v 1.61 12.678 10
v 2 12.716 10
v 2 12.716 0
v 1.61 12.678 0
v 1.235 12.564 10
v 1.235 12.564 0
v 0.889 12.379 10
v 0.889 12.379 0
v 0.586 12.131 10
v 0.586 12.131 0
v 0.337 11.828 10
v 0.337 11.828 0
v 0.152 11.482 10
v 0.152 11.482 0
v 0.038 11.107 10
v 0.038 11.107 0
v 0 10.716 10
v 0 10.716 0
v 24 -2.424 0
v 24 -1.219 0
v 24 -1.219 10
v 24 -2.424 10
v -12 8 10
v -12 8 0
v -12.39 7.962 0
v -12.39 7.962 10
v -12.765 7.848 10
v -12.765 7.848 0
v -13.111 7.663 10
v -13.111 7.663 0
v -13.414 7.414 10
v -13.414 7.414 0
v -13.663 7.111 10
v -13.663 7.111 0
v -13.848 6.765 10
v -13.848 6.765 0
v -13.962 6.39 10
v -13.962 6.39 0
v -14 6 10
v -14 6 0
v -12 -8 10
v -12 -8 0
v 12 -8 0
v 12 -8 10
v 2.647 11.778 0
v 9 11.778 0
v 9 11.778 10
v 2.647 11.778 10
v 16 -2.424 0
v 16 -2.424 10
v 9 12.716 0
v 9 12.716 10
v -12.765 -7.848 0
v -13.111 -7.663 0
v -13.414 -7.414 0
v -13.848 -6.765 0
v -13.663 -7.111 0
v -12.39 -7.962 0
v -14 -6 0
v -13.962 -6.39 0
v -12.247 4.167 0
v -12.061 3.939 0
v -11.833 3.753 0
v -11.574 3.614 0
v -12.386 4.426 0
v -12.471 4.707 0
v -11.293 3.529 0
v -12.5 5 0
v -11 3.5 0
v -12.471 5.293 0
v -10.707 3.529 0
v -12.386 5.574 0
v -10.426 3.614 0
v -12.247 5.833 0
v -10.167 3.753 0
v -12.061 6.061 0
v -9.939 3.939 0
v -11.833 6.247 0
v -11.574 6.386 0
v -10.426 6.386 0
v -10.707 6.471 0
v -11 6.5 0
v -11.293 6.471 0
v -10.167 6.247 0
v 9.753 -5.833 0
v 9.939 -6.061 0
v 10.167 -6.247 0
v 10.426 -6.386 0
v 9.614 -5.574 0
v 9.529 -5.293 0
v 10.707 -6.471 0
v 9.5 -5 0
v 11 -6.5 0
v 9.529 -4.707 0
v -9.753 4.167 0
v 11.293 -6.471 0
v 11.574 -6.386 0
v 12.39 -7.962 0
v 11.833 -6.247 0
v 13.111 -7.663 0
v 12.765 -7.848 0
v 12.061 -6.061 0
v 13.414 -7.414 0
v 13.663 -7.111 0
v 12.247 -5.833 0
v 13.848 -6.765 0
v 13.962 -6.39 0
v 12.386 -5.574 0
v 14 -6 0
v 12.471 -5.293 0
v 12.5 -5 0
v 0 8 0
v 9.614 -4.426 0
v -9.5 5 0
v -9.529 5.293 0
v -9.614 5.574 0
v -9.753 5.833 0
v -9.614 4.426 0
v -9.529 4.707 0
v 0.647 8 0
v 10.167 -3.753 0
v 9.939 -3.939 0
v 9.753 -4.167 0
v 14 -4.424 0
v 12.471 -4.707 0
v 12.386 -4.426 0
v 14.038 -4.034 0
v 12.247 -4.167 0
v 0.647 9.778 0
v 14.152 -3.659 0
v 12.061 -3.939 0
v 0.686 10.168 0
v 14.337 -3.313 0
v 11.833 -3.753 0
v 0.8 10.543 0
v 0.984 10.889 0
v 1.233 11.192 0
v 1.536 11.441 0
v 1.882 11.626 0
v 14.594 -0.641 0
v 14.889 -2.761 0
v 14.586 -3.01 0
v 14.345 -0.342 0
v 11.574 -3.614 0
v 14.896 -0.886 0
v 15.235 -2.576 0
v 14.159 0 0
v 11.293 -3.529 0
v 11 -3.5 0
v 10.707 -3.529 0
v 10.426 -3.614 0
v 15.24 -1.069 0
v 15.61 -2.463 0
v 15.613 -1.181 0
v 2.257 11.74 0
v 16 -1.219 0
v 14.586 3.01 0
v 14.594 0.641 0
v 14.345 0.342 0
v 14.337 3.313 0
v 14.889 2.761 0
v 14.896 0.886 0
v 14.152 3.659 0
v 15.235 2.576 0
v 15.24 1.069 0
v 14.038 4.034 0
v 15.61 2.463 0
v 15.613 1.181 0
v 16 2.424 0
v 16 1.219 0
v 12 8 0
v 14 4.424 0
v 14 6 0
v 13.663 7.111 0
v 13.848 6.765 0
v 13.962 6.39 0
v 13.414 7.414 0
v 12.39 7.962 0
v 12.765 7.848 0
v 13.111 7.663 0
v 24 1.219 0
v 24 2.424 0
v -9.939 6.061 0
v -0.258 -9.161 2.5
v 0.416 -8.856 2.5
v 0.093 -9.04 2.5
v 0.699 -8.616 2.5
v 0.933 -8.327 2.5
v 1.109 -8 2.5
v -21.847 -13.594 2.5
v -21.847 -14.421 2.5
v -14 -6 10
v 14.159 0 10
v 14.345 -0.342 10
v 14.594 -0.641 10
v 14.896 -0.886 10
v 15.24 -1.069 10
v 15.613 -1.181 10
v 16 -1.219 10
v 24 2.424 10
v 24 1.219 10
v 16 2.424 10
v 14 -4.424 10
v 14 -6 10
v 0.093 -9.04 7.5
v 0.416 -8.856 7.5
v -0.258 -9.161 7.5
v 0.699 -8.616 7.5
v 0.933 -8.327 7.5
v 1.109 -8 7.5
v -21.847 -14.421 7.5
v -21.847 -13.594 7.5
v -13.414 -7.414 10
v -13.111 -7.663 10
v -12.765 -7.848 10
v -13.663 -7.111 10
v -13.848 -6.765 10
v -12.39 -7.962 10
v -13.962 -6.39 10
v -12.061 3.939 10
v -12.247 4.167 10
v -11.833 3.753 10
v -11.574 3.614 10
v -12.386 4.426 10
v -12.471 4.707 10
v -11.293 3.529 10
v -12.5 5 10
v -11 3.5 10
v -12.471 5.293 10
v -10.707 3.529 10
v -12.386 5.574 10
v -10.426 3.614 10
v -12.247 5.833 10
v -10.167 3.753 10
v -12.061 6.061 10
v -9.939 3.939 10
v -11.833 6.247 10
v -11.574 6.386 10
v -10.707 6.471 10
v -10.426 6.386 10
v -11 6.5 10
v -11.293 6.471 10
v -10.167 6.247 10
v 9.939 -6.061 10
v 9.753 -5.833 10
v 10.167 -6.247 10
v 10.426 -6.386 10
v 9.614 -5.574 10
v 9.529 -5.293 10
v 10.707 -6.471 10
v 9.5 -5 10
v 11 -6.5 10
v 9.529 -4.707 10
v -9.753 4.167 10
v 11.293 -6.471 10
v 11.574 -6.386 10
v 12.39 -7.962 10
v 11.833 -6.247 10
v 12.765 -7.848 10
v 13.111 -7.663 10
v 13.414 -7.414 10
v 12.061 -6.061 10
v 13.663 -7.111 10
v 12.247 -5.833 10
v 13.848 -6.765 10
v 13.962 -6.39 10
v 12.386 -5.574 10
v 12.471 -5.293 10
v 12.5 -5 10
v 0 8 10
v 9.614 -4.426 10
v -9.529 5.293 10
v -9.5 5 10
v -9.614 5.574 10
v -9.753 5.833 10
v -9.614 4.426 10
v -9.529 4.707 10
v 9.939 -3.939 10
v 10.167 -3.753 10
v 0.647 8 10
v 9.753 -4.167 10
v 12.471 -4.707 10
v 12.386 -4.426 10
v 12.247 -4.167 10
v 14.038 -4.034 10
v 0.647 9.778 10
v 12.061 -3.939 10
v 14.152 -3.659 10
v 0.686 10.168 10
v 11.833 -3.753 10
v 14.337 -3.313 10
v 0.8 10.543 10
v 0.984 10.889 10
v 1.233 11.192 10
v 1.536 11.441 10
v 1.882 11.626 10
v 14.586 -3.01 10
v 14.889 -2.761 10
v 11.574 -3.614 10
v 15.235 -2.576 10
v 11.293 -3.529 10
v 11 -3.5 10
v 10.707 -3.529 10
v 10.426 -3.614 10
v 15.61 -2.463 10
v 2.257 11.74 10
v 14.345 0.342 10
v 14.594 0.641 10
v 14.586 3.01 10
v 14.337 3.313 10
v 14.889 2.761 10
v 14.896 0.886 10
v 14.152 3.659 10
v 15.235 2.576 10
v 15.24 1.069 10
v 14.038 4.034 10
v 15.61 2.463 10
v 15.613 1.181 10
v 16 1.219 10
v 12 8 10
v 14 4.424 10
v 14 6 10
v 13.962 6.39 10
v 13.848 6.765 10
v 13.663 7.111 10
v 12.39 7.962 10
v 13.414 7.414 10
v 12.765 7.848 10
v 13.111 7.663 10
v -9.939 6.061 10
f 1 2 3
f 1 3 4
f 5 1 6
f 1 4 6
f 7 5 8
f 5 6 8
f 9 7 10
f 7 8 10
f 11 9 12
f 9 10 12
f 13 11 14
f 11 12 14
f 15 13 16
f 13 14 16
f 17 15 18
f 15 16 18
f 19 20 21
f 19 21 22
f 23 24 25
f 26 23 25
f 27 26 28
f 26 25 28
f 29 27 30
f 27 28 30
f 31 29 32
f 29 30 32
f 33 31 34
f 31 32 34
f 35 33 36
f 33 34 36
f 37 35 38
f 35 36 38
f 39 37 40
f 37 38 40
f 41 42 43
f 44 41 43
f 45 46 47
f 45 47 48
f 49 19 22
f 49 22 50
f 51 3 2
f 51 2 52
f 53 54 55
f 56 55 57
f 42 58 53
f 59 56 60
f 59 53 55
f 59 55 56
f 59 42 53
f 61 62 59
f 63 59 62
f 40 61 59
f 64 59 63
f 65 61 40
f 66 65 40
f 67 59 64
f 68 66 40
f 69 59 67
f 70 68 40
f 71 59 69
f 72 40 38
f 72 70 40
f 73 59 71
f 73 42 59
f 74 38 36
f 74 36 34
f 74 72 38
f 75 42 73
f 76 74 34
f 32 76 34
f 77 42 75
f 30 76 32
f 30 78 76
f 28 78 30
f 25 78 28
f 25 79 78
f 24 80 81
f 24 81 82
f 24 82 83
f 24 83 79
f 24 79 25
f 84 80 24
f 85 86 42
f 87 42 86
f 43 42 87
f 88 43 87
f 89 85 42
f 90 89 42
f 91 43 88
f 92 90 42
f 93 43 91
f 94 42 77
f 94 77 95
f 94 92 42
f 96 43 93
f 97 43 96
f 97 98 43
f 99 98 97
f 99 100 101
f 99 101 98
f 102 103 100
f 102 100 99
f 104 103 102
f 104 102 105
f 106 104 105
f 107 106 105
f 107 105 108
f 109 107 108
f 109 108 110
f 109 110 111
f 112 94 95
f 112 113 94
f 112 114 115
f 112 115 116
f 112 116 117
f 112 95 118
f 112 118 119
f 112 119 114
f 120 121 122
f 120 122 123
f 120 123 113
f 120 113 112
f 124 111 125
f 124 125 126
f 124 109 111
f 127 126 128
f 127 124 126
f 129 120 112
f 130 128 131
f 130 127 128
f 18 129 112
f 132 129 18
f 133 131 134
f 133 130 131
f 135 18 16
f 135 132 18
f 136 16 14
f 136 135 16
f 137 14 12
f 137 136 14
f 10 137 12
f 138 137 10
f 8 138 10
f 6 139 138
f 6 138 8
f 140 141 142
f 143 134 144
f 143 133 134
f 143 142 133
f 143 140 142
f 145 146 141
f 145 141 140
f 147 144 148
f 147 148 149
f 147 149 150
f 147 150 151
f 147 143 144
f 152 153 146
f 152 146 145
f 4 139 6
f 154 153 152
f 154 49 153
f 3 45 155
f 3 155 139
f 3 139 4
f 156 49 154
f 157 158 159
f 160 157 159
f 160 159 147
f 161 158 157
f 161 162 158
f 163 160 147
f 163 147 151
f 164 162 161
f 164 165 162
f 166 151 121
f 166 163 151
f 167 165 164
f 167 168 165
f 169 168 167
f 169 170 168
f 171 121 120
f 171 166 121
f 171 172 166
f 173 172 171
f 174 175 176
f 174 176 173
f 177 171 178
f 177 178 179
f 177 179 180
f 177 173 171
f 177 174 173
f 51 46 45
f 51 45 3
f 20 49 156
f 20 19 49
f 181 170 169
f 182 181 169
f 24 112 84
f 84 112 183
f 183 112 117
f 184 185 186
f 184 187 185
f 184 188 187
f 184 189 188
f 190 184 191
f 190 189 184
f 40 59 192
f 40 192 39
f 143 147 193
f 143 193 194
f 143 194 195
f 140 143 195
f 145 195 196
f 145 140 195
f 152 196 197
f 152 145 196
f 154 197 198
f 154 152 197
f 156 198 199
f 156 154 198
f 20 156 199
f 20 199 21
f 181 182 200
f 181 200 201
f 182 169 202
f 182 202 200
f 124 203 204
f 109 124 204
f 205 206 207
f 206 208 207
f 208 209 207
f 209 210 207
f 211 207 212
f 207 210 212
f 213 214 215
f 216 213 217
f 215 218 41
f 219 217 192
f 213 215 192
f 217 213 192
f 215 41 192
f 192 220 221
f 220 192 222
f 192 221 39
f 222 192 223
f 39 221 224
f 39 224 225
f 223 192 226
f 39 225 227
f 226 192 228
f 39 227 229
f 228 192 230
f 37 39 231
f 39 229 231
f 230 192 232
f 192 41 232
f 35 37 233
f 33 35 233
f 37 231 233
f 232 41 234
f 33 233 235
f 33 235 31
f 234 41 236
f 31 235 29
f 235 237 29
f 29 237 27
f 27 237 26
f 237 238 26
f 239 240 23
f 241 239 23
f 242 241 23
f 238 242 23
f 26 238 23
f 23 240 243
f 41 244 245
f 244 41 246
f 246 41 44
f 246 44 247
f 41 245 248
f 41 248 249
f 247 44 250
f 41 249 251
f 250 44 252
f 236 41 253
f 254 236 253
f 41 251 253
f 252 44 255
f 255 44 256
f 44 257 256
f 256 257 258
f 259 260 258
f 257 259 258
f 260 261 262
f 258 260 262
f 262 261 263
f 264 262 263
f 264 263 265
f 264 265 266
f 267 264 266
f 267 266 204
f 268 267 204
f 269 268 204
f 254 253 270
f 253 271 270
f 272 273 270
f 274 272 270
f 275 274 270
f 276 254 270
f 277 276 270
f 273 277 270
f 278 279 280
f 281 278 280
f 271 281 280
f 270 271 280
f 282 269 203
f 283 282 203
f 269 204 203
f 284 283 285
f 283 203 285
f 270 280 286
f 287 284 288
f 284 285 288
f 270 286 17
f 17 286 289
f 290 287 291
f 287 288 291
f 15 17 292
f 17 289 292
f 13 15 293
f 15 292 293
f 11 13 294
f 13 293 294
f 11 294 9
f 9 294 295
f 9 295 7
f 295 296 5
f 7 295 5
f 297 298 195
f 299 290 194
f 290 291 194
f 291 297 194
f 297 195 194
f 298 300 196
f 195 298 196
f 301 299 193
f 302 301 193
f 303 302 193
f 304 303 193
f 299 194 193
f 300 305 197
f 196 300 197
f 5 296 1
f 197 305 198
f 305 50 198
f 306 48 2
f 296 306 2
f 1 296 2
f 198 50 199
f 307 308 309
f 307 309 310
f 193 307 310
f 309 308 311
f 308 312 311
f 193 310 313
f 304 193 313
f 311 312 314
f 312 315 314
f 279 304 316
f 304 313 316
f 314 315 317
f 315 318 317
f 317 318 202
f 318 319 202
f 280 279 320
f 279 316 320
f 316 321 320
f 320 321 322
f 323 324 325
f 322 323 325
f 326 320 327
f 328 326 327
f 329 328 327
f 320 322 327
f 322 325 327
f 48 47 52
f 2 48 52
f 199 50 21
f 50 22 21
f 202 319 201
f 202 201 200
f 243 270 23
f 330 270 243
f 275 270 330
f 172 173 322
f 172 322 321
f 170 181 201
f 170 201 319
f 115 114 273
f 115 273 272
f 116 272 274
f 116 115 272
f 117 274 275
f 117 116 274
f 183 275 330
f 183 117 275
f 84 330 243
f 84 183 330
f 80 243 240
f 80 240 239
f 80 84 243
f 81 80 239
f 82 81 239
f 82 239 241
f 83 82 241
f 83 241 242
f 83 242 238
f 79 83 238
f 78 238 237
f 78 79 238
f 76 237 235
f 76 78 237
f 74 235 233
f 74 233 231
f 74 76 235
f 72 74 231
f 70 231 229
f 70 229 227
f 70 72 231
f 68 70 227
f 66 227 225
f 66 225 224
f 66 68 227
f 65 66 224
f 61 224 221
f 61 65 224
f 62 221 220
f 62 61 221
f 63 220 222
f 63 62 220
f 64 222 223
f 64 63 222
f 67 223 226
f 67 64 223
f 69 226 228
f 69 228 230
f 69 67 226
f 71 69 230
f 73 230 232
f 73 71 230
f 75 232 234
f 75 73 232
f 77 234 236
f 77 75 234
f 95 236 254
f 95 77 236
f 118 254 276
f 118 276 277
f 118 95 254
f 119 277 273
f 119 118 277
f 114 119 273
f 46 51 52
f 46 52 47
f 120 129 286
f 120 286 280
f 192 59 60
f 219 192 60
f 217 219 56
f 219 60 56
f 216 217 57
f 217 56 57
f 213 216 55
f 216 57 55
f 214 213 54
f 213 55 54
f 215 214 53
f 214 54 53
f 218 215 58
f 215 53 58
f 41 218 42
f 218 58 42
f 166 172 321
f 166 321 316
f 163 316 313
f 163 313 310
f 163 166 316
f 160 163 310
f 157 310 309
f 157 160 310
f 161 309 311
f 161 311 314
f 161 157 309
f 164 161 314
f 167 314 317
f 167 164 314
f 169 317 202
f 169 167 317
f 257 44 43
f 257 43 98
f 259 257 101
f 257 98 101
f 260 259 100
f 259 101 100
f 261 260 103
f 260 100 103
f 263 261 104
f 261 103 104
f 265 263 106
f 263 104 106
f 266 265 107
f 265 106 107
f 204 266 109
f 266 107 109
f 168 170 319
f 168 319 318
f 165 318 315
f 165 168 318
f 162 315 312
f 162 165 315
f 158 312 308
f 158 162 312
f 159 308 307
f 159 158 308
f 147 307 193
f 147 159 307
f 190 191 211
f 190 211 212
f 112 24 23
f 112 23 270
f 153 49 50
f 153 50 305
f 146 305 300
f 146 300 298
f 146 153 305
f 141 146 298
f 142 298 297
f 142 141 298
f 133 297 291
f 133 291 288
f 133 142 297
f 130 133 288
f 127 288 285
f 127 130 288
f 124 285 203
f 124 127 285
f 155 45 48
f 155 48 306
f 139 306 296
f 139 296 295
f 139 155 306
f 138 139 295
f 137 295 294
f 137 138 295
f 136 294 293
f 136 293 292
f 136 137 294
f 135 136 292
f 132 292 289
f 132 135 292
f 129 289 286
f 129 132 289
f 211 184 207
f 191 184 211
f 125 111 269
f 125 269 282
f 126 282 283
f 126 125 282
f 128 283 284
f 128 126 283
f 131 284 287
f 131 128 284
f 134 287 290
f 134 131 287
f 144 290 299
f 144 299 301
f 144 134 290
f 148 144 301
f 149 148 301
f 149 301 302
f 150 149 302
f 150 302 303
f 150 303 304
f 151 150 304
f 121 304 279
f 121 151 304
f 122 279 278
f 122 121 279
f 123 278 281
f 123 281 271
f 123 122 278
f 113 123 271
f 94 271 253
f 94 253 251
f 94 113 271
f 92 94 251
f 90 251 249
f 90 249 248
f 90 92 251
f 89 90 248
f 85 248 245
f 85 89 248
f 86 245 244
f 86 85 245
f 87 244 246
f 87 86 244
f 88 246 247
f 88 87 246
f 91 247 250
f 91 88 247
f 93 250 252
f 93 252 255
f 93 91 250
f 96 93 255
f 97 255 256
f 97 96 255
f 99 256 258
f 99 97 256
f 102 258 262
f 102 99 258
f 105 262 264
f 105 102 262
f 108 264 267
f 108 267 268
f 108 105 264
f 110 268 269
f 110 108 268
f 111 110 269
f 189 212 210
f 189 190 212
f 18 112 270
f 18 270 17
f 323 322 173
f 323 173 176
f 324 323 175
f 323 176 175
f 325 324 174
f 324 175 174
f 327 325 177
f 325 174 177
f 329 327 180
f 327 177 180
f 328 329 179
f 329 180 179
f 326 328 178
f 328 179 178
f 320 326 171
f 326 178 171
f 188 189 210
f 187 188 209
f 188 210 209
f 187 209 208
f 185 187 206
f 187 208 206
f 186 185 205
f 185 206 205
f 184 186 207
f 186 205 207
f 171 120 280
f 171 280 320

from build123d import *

# Parameters (mm, degrees)
SKETCH2_R           = 1.5
BOSS_EXTRUDE1_DEPTH = 10
FILLET1_R           = 2
BOSS_EXTRUDE2_DEPTH = 2.5
FILLET2_R           = 2


with BuildPart() as part:
    # Sketch2 → Boss-Extrude1 (new body)
    with BuildSketch(Plane.XY):
        Polygon((0, 8), (0, 12.716374873), (9, 12.716374873), (9, 11.778068475), (0.647378108, 11.778068475), (0.647378108, 8), (14, 8), (14, 2.424084127), (24, 2.424084127), (24, 1.218725863), (14, 1.218725863), (14, -1.218725863), (24, -1.218725863), (24, -2.424084127), (14, -2.424084127), (14, -8), (3.483162405, -8), (-14, -8), (-14, 8), align=None)
        with Locations((-11, 5)):
            Circle(SKETCH2_R, mode=Mode.SUBTRACT)
        with Locations((11, -5)):
            Circle(SKETCH2_R, mode=Mode.SUBTRACT)
    extrude(amount=BOSS_EXTRUDE1_DEPTH)

    # Fillet1
    # the kernel refuses this fillet: 2 mm, written as the material it adds along each edge
    with BuildSketch(Plane(origin=(0.647378108, 11.778068475, 0), x_dir=(0, -1, 0), z_dir=(0, 0, 1)), Plane(origin=(14, 2.424084127, 0), x_dir=(1, 0, 0), z_dir=(0, 0, 1)), Plane(origin=(14, 1.218725863, 0), x_dir=(0, -1, 0), z_dir=(0, 0, 1)), Plane(origin=(14, -1.218725863, 0), x_dir=(1, 0, 0), z_dir=(0, 0, 1)), Plane(origin=(14, -2.424084127, 0), x_dir=(0, -1, 0), z_dir=(0, 0, 1))) as fillet1_piece_1:
        with BuildLine():
            CenterArc((FILLET1_R, FILLET1_R), FILLET1_R, 180, 90)
            Line((0, FILLET1_R), (0, 0))
            Line((0, 0), (FILLET1_R, 0))
        make_face()
    extrude(amount=10)
    # the kernel refuses this fillet: 2 mm, written as the material it takes off along each edge
    with BuildSketch(Plane(origin=(0, 12.716374873, -5), x_dir=(0, -1, 0), z_dir=(0, 0, 1)), Plane(origin=(14, 8, -5), x_dir=(-1, 0, 0), z_dir=(0, 0, 1)), Plane(origin=(14, -8, -5), x_dir=(0, 1, 0), z_dir=(0, 0, 1))) as fillet1_2_piece_1:
        with BuildLine():
            CenterArc((FILLET1_R, FILLET1_R), FILLET1_R, 180, 90)
            Line((0, FILLET1_R), (0, 0))
            Line((0, 0), (FILLET1_R, 0))
        make_face()
    extrude(amount=20, mode=Mode.SUBTRACT)
    with BuildSketch(Plane(origin=(-14, -8, -5), x_dir=(0, 1, 0), z_dir=(0, 0, 1)), Plane(origin=(-14, 8, -5), x_dir=(1, 0, 0), z_dir=(0, 0, 1))) as fillet1_2_piece_2:
        with BuildLine():
            CenterArc((FILLET1_R, -FILLET1_R), FILLET1_R, 90, 90)
            Line((0, -FILLET1_R), (0, 0))
            Line((0, 0), (FILLET1_R, 0))
        make_face()
    extrude(amount=20, mode=Mode.SUBTRACT)


with BuildPart() as body_2:
    # Sketch3 → Boss-Extrude2 (new, symmetric)
    with BuildSketch(Plane(origin=(0, 0, 5), x_dir=(-1, 0, 0), z_dir=(0, 0, -1))):
        Polygon((-1.109166196, -8), (-1.109166196, -8.82795975), (21.846753247, -14.421033343), (21.846753247, -13.594231159), align=None)
    extrude(amount=BOSS_EXTRUDE2_DEPTH, both=True)

    # Fillet2
    # the kernel refuses this fillet: 2 mm, written as the material it takes off along each edge
    with BuildSketch(Plane(origin=(1.109166196, -8.82795975, 11.018292786), x_dir=(0, 1, 0), z_dir=(0, 0, -1))) as fillet2_piece_1:
        with BuildLine():
            CenterArc((1.610017159, -1.840756966), FILLET2_R, 113.018523563, 53.28848865)
            Line((-0.333139038, -1.367318486), (-0.372002162, -1.357849716))
            Line((-0.372002162, -1.357849716), (-0.038863124, 0.00946877))
            Line((-0.038863124, 0.00946877), (0, 0.04))
            ThreePointArc((0, 0.04), (0.413979875, 0.04), (0.812318601, 0.036815139))
            Line((0.812318601, 0.036815139), (0.82795975, 0))
        make_face()
    extrude(amount=12.036585572, mode=Mode.SUBTRACT)


solid = Compound([part.part, body_2.part])
